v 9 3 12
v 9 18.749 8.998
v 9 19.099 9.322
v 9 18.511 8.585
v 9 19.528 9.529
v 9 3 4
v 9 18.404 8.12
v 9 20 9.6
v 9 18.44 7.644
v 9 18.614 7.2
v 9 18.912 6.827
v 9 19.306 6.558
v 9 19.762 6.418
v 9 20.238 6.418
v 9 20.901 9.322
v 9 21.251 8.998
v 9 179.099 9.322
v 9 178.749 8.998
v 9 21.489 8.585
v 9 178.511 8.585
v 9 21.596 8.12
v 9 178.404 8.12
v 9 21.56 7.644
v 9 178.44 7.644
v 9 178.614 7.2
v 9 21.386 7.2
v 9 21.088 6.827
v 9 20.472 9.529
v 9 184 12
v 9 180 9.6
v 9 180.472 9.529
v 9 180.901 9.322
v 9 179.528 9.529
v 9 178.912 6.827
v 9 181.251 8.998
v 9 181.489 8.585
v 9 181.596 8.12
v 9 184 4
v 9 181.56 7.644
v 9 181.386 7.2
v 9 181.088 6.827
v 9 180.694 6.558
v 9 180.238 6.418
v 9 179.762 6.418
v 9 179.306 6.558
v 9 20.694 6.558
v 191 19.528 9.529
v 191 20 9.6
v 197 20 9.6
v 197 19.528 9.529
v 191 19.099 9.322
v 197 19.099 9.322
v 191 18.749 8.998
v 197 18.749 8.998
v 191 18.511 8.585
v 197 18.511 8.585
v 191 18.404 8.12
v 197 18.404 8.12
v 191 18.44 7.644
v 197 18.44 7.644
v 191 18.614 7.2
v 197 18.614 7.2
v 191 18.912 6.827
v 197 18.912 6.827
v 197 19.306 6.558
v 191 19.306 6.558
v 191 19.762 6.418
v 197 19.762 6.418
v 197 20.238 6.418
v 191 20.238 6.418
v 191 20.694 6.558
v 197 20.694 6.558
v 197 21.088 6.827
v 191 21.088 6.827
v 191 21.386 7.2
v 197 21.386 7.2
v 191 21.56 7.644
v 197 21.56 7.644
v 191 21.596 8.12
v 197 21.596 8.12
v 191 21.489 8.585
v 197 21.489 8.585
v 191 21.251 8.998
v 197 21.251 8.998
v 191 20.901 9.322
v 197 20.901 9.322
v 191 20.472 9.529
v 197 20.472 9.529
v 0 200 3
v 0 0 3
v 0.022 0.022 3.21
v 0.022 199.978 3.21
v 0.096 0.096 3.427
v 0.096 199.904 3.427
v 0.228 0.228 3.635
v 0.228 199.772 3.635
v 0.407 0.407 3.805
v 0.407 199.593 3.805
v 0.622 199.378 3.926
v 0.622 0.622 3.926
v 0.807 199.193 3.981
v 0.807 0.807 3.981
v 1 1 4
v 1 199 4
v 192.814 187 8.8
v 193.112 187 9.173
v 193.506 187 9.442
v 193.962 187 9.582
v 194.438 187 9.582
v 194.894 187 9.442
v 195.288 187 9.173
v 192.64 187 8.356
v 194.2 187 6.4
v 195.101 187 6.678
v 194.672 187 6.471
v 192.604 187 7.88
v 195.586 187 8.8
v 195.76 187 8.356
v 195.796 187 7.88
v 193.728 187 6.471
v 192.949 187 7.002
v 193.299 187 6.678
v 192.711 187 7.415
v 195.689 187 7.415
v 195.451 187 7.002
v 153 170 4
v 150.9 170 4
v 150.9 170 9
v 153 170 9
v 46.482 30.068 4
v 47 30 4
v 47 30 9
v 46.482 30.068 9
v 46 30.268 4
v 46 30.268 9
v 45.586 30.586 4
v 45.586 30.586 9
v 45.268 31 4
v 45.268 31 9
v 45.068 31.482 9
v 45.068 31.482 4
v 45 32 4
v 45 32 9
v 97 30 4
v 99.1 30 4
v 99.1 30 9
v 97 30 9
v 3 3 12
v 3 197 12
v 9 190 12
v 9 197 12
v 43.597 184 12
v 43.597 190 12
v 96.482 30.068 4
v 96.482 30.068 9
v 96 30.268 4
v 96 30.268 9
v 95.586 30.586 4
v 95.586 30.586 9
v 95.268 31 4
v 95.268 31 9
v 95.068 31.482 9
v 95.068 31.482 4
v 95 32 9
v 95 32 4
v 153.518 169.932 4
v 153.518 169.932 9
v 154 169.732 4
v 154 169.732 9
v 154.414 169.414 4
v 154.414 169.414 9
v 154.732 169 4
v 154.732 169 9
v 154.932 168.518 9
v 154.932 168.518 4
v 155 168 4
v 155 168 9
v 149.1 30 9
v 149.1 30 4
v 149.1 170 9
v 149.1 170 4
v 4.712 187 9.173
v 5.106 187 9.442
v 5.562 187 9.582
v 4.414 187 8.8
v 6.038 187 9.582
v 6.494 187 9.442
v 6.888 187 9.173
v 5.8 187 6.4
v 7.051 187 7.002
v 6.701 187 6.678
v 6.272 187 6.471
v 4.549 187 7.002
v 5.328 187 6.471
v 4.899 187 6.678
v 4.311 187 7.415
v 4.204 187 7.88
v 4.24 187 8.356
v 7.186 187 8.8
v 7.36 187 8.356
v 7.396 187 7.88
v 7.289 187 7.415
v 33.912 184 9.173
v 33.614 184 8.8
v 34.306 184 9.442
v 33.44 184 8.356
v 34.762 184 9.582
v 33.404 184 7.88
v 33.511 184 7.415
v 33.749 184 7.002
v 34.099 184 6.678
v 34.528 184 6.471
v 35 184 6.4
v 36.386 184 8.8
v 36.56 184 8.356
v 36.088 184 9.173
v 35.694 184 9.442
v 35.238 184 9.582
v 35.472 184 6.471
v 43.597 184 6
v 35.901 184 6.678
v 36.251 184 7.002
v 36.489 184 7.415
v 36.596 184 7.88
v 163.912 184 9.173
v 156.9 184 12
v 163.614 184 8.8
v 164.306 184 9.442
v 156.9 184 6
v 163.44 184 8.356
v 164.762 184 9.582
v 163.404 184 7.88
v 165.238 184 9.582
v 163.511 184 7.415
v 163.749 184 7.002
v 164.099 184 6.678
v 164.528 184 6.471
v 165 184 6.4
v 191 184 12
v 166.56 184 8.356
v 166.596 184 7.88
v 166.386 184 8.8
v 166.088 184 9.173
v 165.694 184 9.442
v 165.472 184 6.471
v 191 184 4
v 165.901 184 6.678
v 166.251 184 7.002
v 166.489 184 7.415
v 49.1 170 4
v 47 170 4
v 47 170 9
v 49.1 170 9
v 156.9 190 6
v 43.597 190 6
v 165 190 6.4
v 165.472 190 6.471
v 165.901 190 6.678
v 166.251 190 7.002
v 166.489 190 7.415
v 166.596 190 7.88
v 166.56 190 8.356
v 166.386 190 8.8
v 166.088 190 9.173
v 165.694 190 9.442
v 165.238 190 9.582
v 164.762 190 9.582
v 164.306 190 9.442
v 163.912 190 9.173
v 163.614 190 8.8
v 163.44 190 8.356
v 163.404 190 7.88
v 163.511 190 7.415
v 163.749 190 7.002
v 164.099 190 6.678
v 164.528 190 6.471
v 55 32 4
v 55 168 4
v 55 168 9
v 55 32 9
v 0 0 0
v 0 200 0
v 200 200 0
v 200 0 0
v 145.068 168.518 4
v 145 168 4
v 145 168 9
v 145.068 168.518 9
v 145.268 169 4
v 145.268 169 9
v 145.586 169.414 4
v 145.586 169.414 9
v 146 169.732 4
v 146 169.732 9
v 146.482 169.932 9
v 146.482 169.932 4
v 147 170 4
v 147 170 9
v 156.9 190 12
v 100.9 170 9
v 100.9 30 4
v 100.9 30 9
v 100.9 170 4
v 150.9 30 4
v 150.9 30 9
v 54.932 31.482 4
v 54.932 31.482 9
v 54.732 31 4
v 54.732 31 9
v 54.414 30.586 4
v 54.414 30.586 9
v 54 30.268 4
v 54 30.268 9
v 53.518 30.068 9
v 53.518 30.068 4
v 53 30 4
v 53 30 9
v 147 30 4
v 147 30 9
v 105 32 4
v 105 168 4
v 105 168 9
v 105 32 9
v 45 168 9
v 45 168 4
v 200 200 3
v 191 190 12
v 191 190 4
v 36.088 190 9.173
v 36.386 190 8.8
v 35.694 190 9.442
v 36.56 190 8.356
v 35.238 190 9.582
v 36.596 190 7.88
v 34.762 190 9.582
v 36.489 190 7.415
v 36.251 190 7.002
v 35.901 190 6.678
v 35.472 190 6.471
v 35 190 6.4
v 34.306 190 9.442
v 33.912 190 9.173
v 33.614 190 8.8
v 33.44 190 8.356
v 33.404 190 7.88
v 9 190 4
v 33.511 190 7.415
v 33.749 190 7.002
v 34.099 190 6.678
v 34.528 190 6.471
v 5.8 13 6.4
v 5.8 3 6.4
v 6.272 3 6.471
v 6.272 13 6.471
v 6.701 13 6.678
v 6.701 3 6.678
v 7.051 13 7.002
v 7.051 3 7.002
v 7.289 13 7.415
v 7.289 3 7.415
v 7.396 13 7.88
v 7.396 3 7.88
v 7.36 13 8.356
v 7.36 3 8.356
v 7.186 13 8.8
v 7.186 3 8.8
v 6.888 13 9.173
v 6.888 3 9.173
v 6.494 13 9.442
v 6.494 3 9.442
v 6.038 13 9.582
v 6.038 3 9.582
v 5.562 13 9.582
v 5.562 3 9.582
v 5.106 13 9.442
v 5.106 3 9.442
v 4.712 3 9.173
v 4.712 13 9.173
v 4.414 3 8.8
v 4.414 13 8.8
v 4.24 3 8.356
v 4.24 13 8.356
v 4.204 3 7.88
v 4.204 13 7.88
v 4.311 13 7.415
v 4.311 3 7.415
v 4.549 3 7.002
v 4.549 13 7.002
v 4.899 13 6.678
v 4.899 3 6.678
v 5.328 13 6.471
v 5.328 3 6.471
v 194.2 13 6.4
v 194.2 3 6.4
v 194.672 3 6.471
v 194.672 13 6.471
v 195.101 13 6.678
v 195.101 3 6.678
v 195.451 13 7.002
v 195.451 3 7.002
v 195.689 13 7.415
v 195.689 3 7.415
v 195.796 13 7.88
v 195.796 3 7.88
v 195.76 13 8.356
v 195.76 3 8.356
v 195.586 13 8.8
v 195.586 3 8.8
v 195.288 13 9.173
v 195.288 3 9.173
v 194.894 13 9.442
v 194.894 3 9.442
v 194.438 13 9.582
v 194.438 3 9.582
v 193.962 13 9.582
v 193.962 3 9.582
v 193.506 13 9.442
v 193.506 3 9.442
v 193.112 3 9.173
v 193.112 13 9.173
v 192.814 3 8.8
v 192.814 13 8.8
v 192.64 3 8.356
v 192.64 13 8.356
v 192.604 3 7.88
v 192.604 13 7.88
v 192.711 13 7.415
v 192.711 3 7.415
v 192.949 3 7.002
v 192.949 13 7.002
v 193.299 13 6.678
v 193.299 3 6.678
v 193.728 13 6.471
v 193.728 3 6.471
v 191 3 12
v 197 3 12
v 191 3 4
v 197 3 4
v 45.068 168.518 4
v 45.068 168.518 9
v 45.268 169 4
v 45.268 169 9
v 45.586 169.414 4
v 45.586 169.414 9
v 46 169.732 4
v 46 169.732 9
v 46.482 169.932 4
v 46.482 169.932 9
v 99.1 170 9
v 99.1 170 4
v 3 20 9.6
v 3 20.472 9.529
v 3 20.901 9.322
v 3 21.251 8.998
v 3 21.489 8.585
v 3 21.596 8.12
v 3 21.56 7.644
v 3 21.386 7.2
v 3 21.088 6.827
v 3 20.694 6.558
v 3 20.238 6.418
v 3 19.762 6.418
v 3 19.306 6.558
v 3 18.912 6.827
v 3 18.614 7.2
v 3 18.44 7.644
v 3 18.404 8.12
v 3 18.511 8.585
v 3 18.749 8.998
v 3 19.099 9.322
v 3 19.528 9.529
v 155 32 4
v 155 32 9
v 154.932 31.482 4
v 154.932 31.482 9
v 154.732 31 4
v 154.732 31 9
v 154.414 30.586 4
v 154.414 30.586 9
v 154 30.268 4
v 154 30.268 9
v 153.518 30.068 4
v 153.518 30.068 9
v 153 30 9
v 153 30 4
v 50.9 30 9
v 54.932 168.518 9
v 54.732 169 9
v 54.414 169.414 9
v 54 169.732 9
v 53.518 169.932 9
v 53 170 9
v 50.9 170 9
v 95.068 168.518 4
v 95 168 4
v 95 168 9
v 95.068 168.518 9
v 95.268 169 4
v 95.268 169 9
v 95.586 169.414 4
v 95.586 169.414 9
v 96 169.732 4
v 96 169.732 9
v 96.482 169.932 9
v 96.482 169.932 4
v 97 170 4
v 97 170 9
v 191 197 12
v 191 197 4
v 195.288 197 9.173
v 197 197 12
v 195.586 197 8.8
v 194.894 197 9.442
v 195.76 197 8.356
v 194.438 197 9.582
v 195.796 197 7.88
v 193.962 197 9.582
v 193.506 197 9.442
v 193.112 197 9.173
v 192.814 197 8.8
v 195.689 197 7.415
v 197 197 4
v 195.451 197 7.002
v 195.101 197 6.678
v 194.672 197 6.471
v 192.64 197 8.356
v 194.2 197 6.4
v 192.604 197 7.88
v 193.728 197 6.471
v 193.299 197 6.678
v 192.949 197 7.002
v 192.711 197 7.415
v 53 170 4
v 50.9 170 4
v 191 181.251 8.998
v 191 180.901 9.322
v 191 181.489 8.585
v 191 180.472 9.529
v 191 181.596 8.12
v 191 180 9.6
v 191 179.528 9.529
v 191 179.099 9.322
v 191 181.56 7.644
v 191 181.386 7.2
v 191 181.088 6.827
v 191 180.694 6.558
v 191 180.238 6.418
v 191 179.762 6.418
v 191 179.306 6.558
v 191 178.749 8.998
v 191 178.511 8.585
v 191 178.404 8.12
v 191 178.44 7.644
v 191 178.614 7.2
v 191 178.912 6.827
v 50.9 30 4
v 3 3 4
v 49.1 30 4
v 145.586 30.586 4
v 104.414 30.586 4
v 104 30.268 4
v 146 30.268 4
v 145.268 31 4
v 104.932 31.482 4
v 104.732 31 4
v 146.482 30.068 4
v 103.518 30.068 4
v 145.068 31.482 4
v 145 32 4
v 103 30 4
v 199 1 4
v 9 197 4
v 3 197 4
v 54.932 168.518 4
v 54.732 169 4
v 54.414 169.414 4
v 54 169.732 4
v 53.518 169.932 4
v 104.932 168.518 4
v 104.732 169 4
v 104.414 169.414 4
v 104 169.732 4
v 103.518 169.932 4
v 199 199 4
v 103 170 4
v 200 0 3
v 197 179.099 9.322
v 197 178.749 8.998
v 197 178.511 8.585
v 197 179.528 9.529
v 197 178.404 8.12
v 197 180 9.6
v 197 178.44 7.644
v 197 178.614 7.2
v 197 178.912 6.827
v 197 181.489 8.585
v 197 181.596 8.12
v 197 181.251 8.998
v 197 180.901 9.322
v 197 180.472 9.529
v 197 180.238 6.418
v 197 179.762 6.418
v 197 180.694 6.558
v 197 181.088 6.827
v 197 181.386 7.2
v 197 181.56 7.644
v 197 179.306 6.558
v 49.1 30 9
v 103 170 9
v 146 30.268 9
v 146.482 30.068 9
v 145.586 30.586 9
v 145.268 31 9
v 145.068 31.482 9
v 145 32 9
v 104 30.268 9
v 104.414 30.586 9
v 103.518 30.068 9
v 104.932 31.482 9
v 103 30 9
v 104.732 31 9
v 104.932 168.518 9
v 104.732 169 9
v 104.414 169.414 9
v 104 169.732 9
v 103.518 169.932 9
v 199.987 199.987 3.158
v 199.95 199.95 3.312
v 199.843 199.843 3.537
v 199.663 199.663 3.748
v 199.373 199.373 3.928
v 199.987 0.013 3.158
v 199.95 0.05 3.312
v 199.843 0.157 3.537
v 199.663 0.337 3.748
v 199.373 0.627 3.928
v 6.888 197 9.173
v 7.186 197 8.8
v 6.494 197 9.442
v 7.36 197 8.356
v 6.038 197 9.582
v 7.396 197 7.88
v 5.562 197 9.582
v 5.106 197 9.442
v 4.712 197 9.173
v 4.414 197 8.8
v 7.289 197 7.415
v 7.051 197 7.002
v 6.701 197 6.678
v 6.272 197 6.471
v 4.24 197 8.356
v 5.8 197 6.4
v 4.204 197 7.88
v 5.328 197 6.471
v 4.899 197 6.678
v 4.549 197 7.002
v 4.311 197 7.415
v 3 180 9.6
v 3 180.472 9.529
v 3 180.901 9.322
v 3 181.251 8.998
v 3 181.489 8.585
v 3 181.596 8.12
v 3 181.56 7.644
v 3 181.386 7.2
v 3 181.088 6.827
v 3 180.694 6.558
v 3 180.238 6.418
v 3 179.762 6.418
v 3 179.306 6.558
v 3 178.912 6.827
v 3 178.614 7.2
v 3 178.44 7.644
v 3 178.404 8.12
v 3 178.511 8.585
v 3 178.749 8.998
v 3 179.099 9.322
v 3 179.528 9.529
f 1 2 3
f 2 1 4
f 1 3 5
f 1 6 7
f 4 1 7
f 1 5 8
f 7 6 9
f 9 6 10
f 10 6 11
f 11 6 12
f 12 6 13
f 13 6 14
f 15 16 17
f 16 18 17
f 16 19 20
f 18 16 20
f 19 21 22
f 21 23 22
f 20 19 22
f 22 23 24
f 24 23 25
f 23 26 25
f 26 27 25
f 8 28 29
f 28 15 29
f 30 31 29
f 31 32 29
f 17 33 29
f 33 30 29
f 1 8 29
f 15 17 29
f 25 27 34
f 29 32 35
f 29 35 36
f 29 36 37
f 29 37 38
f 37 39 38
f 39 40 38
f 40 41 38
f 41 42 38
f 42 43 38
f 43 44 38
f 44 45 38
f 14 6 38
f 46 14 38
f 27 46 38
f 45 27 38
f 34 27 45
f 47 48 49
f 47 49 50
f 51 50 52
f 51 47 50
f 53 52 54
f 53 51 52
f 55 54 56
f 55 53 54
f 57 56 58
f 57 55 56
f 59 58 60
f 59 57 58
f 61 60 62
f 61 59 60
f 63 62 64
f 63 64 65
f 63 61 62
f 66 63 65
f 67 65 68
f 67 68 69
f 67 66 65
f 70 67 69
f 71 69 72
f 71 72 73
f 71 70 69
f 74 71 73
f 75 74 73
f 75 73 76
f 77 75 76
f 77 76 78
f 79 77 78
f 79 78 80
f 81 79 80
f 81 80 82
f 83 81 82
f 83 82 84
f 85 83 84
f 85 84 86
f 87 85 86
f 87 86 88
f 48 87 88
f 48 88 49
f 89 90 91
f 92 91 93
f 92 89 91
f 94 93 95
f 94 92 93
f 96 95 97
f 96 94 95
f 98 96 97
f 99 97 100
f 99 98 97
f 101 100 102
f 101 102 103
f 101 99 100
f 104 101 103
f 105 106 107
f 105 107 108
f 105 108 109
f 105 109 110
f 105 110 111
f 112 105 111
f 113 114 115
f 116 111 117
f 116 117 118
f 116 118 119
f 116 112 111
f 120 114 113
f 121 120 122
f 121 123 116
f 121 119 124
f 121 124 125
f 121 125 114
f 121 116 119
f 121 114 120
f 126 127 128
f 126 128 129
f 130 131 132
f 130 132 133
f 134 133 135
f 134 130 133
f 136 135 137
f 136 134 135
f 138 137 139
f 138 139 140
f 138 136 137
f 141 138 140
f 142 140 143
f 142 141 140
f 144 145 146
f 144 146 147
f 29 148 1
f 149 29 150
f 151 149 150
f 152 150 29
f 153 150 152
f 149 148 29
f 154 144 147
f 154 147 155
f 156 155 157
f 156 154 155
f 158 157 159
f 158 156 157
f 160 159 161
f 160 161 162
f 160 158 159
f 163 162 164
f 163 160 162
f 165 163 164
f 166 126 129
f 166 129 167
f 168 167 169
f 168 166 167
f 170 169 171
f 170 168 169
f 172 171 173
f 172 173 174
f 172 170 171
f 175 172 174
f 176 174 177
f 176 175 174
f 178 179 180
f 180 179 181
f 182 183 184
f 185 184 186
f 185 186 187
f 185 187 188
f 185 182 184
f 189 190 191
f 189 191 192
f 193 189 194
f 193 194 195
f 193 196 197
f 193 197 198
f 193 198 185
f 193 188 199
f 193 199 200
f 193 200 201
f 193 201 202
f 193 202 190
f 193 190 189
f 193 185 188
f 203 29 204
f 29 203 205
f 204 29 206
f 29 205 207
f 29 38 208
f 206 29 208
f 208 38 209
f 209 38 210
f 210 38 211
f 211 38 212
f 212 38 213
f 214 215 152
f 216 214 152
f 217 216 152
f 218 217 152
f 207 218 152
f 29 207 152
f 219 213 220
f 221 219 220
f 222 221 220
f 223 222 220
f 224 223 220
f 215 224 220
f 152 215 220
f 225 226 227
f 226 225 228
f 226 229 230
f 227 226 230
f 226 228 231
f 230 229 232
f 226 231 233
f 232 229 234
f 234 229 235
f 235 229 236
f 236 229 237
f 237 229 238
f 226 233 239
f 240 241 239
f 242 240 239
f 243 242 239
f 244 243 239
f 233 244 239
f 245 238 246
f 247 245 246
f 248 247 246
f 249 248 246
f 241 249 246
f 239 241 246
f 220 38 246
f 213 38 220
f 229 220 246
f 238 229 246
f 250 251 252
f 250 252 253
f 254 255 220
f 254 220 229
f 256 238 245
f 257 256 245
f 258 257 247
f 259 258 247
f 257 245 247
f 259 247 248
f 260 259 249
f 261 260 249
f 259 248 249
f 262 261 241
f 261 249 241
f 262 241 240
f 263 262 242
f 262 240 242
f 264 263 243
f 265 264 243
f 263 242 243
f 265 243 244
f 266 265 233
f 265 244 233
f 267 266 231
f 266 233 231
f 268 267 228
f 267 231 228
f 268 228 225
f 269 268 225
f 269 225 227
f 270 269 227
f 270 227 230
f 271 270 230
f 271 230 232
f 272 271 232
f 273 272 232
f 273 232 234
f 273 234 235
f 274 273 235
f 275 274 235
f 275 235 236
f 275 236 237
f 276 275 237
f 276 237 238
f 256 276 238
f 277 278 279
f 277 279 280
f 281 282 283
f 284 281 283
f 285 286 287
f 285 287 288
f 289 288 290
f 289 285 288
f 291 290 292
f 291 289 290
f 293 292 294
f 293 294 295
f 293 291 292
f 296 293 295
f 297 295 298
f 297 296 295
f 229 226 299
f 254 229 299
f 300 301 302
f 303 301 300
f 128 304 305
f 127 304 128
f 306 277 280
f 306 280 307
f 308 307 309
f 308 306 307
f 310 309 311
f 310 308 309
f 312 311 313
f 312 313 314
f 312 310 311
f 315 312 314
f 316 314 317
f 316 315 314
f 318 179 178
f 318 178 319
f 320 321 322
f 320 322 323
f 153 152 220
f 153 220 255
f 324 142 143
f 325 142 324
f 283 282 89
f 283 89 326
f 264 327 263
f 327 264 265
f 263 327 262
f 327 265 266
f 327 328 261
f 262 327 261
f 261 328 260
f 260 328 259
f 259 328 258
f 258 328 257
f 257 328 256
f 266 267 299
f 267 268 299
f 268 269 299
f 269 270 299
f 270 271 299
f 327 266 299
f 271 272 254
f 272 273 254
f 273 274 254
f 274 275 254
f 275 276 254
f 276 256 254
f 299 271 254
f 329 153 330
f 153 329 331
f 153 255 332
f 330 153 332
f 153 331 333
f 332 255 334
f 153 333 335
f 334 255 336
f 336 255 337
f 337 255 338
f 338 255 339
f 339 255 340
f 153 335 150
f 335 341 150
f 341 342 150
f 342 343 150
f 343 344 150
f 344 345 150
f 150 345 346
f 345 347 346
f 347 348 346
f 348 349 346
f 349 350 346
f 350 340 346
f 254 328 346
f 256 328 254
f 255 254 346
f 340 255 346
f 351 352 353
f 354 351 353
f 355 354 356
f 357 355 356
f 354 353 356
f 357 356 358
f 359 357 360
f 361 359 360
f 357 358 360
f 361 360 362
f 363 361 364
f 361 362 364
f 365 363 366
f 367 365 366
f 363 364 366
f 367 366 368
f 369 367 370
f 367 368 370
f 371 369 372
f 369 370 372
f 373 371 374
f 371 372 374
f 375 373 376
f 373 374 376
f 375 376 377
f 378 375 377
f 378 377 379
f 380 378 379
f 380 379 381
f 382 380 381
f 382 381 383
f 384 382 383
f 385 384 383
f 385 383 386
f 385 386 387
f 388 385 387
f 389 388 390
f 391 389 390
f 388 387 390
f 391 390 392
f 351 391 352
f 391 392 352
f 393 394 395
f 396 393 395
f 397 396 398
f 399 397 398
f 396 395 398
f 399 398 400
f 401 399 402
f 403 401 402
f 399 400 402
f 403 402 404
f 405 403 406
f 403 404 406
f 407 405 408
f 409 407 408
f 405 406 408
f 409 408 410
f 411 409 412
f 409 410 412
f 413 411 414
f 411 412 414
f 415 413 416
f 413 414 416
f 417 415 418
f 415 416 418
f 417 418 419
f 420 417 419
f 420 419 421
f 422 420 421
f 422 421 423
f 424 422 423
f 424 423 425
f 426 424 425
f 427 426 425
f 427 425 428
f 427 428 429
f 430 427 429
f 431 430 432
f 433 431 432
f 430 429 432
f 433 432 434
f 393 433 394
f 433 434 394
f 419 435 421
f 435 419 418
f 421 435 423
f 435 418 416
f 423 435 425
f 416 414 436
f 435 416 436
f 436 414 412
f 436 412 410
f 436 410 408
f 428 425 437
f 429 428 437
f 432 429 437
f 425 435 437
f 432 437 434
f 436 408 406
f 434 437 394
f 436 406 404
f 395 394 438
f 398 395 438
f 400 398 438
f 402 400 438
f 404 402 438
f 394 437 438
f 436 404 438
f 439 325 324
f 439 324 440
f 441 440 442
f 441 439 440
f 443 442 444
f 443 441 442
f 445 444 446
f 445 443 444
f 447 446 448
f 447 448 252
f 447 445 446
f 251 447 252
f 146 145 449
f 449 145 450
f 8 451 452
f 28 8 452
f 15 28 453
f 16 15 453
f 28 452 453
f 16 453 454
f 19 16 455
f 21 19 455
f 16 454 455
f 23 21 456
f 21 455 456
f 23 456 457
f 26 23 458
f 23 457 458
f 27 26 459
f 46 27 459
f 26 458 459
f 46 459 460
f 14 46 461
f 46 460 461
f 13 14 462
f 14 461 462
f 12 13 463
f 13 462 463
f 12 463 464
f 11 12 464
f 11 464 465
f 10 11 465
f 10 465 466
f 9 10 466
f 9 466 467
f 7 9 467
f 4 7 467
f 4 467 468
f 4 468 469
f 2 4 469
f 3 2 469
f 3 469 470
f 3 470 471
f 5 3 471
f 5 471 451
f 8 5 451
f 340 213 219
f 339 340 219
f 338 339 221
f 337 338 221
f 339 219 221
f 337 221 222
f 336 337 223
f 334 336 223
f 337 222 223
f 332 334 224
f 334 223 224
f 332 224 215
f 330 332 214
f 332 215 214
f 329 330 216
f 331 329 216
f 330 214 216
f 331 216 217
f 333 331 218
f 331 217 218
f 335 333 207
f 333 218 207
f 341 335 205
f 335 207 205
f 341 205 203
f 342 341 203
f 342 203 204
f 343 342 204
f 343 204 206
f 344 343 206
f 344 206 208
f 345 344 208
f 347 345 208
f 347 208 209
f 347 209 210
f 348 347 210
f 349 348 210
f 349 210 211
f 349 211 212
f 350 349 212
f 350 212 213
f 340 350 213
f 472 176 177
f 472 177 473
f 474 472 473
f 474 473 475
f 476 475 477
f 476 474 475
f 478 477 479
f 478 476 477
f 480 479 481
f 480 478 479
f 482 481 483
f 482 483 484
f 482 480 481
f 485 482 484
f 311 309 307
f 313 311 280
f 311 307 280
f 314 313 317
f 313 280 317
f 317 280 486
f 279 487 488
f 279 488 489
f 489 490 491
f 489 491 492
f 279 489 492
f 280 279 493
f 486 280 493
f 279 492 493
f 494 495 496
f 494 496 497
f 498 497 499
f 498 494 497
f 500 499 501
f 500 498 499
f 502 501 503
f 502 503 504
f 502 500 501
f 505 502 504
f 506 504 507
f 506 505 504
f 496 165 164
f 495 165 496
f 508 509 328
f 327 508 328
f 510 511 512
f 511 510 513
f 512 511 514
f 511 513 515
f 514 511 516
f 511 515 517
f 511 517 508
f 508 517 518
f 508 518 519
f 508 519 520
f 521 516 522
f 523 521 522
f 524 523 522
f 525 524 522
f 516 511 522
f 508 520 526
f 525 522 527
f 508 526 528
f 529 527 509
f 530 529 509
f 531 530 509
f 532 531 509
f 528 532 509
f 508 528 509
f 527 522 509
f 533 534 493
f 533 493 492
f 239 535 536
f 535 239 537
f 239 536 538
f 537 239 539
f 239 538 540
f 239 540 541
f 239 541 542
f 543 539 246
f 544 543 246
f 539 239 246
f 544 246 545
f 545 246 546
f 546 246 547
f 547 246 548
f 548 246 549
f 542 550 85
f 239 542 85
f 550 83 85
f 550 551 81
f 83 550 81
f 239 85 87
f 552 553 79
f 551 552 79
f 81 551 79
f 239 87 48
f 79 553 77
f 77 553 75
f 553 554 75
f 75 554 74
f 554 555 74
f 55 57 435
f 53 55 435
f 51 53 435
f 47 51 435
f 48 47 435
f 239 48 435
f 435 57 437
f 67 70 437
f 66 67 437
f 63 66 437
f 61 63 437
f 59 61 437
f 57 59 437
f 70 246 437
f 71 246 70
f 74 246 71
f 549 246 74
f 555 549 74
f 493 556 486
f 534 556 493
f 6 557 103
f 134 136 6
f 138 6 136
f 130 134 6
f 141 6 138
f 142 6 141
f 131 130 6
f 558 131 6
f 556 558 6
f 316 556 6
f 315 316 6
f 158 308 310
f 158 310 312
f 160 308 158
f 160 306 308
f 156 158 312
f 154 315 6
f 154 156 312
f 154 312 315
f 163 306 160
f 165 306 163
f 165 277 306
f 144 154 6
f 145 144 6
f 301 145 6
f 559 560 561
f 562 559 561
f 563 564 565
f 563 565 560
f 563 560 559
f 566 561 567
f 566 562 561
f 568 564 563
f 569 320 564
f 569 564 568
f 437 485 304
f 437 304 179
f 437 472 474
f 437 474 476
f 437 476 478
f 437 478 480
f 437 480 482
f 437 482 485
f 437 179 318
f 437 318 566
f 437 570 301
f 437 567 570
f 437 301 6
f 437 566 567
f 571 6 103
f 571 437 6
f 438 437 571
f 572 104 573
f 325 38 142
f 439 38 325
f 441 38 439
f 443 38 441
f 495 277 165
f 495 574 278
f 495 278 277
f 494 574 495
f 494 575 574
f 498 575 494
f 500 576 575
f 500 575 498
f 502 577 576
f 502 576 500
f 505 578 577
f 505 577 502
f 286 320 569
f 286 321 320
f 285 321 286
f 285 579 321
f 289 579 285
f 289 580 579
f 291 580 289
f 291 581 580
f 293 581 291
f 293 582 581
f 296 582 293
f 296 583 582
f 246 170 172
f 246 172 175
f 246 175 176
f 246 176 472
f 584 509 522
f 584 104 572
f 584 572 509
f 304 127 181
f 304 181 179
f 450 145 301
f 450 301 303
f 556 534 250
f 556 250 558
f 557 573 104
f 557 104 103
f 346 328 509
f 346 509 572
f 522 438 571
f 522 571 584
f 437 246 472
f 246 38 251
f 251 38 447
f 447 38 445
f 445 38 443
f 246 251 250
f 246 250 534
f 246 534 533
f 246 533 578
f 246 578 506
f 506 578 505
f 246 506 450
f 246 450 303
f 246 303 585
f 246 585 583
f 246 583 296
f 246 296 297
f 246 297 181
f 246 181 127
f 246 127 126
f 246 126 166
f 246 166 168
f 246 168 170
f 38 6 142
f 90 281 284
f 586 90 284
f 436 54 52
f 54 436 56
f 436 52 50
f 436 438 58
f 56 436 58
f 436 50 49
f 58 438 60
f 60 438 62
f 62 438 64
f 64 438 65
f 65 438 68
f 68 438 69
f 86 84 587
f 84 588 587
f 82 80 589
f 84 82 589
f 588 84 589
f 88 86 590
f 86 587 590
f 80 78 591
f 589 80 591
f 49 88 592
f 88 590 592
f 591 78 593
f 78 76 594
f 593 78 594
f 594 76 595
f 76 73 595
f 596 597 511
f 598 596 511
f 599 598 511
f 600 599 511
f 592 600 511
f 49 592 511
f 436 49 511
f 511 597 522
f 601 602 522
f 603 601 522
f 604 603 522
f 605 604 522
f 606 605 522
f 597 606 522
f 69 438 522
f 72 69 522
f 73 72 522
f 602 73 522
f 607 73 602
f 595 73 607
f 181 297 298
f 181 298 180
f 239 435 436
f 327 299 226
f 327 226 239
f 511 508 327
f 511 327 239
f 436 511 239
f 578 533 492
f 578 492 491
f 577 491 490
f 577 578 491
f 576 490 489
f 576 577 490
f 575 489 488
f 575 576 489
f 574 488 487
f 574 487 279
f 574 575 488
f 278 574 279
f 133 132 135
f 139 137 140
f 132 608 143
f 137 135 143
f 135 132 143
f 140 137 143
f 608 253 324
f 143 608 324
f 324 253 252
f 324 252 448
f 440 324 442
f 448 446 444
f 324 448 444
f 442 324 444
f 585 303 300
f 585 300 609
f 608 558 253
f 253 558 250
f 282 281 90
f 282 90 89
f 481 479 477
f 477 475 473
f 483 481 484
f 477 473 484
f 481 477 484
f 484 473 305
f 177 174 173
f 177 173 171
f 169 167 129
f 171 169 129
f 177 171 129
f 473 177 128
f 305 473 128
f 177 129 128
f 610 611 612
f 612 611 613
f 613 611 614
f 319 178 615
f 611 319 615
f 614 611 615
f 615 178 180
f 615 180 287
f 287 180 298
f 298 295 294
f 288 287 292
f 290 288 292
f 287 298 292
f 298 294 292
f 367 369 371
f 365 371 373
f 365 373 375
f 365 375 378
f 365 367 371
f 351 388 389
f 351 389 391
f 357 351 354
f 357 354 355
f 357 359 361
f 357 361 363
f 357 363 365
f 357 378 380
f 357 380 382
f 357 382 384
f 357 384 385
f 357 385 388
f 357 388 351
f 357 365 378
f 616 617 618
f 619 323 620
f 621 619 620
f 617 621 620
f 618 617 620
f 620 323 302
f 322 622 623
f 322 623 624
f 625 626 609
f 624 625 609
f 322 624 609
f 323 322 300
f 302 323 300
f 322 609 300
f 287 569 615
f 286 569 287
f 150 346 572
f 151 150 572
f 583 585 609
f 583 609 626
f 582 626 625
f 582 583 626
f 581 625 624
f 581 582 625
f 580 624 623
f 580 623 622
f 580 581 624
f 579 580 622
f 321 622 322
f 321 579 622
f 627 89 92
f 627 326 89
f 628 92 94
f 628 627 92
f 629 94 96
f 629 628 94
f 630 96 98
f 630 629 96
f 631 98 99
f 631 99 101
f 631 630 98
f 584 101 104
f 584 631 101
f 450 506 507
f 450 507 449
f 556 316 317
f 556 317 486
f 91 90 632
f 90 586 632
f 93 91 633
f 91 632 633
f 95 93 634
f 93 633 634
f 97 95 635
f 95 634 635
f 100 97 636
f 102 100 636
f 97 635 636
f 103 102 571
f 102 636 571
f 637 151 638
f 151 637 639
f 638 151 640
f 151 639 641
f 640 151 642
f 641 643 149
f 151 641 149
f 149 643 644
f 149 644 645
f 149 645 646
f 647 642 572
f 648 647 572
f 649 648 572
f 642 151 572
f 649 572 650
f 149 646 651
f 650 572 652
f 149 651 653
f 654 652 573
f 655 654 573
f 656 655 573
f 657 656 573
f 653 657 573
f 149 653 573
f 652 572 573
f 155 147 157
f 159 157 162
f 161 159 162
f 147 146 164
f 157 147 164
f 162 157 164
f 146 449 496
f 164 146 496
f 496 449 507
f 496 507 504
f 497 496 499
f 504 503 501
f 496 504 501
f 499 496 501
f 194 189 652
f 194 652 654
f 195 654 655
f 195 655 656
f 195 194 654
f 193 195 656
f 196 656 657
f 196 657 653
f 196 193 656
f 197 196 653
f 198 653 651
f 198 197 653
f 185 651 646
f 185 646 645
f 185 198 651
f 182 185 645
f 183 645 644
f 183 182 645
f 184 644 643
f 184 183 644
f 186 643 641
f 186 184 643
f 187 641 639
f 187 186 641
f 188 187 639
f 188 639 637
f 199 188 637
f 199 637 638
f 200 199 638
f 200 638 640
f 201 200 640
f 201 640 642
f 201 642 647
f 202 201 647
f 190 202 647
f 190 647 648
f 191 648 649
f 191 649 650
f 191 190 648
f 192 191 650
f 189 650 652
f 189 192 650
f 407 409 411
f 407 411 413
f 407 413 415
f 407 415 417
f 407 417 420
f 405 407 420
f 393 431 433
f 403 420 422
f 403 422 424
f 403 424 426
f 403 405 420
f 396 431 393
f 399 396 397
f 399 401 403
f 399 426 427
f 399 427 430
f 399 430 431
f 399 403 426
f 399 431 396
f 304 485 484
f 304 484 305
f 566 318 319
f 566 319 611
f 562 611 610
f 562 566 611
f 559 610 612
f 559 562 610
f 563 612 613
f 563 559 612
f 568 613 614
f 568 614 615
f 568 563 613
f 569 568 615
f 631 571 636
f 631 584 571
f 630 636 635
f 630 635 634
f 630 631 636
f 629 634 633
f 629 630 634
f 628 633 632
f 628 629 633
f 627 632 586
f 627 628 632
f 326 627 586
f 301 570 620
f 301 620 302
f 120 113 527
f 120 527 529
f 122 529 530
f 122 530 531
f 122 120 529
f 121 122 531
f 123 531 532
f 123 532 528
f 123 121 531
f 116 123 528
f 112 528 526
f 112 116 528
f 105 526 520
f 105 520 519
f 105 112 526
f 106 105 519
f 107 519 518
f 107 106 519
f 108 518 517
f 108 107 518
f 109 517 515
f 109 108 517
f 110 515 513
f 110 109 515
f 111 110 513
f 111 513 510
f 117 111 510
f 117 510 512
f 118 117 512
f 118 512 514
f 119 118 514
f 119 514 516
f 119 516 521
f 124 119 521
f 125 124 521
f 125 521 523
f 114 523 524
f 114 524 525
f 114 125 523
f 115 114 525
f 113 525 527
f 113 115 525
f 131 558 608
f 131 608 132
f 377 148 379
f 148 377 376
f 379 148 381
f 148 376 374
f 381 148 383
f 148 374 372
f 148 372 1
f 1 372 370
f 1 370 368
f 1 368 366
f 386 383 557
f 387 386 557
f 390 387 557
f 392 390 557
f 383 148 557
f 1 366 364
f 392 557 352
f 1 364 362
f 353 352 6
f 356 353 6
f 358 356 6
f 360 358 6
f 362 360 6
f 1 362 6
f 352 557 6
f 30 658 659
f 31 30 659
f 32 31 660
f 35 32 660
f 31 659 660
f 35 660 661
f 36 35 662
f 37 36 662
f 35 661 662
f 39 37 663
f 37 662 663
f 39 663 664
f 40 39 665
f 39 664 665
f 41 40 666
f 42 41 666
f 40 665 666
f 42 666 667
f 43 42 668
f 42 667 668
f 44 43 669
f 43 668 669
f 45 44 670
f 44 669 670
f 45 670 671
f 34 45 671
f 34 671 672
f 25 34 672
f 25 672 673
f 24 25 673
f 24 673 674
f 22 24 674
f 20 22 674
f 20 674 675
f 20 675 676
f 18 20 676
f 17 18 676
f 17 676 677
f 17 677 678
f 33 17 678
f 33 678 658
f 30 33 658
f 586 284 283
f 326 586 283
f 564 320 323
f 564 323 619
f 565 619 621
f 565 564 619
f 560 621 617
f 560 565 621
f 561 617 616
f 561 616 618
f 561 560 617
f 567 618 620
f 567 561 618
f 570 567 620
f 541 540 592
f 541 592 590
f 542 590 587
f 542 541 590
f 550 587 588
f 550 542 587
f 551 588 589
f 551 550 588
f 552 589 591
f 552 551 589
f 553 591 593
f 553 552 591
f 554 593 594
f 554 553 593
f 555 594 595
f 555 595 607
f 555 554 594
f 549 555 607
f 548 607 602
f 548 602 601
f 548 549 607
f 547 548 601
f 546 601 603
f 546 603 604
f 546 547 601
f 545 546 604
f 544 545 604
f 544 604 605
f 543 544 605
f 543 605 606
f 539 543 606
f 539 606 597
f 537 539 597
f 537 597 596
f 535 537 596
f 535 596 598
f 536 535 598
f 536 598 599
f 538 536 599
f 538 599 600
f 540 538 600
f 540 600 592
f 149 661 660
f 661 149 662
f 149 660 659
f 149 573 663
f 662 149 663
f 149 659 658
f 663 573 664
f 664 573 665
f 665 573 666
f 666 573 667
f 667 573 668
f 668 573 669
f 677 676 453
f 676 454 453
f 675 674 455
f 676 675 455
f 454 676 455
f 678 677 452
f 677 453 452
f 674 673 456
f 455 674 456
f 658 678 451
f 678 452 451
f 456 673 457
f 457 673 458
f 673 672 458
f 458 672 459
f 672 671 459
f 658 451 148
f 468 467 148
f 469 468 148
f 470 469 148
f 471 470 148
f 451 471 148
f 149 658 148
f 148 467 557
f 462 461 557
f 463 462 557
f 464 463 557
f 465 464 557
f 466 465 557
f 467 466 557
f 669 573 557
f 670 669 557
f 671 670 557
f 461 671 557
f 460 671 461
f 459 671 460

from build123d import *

# Parameters (mm, degrees)
ESQUISSE1_W                 = 200
ESQUISSE1_H                 = 200
BOSS_EXTRU_PAROIE_DEPTH     = 4
BOSS_EXTRU_BORDS_DEPTH      = 8
BOSS_EXTRU_GLISSIERES_DEPTH = 5
CONG_1_R                    = 1
ESQUISSE8_W                 = 1.8
ESQUISSE8_H                 = 180
ENL_V_MAT_EXTRU_6_DEPTH     = 283.955826941
ESQUISSE5_R                 = 1.6
ENL_V_MAT_EXTRU_2_DEPTH     = 10
ENL_V_START                 = -10
ESQUISSE6_R                 = 1.6
ENL_V_MAT_EXTRU_3_DEPTH     = 10
ESQUISSE7_R                 = 1.6
ENL_V_MAT_EXTRU_4_DEPTH     = 10
ESQUISSE10_R                = 1.6
ENL_V_MAT_EXTRU_8_DEPTH     = 10
ESQUISSE11_W                = 113.303164178
ESQUISSE11_H                = 6
ENL_V_MAT_EXTRU_9_DEPTH     = 6
ESQUISSE9_R                 = 1.6
ENL_V_MAT_EXTRU_10_DEPTH    = 10


with BuildPart() as part:
    # Esquisse1 → Boss.-Extru. Paroie (new body)
    with BuildSketch(Plane.XY):
        with Locations((100, 100)):
            Rectangle(ESQUISSE1_W, ESQUISSE1_H)
    extrude(amount=BOSS_EXTRU_PAROIE_DEPTH)

    # Esquisse4 → Boss.-Extru. Bords (add)
    with BuildSketch(Plane.XY.offset(4)):
        Polygon((3, 3), (9, 3), (9, 184), (191, 184), (191, 3), (197, 3), (197, 197), (191, 197), (191, 190), (9, 190), (9, 197), (3, 197), align=None)
    extrude(amount=BOSS_EXTRU_BORDS_DEPTH)

    # Esquisse2 → Boss.-Extru. Glissieres (add)
    with BuildSketch(Plane.XY.offset(4)):
        with BuildLine():
            Line((47, 170), (53, 170))
            ThreePointArc((53, 170), (54.414213562, 169.414213562), (55, 168))
            Line((55, 168), (55, 32))
            ThreePointArc((55, 32), (54.414213562, 30.585786438), (53, 30))
            Line((53, 30), (47, 30))
            ThreePointArc((47, 30), (45.585786438, 30.585786438), (45, 32))
            Line((45, 32), (45, 168))
            ThreePointArc((45, 168), (45.585786438, 169.414213562), (47, 170))
        make_face()
        with BuildLine():
            Line((97, 170), (103, 170))
            ThreePointArc((103, 170), (104.414213562, 169.414213562), (105, 168))
            Line((105, 168), (105, 32))
            ThreePointArc((105, 32), (104.414213562, 30.585786438), (103, 30))
            Line((103, 30), (97, 30))
            ThreePointArc((97, 30), (95.585786438, 30.585786438), (95, 32))
            Line((95, 32), (95, 168))
            ThreePointArc((95, 168), (95.585786438, 169.414213562), (97, 170))
        make_face()
        with BuildLine():
            Line((147, 170), (153, 170))
            ThreePointArc((153, 170), (154.414213562, 169.414213562), (155, 168))
            Line((155, 168), (155, 32))
            ThreePointArc((155, 32), (154.414213562, 30.585786438), (153, 30))
            Line((153, 30), (147, 30))
            ThreePointArc((147, 30), (145.585786438, 30.585786438), (145, 32))
            Line((145, 32), (145, 168))
            ThreePointArc((145, 168), (145.585786438, 169.414213562), (147, 170))
        make_face()
    extrude(amount=BOSS_EXTRU_GLISSIERES_DEPTH)

    # Congé1
    cong_1_edges = [part.edges().sort_by_distance(p)[0] for p in [
        (200, 100, 4),
        (100, 200, 4),
        (0, 100, 4),
        (100, 0, 4),
    ]]
    fillet(cong_1_edges, radius=CONG_1_R)

    # Esquisse8 → Enlèv. mat.-Extru.6 (cut, through all)
    with BuildSketch(Plane.XY.offset(4)):
        with Locations((100, 85)):
            Rectangle(ESQUISSE8_W, ESQUISSE8_H)
        with Locations((150, 85)):
            Rectangle(ESQUISSE8_W, ESQUISSE8_H)
        with Locations((50, 85)):
            Rectangle(ESQUISSE8_W, ESQUISSE8_H)
    extrude(amount=ENL_V_MAT_EXTRU_6_DEPTH, mode=Mode.SUBTRACT)

    # Esquisse5 → Enlèv. mat.-Extru.2 (cut)
    with BuildSketch(Plane.ZY.offset(-3)):
        with Locations((8, 180)):
            Circle(ESQUISSE5_R)
        with Locations((8, 20)):
            Circle(ESQUISSE5_R)
    extrude(amount=-ENL_V_MAT_EXTRU_2_DEPTH, mode=Mode.SUBTRACT)

    # Esquisse6 → Enlèv. mat.-Extru.3 (cut)
    with BuildSketch(Plane(origin=(197, 0, 0), x_dir=(0, 0, -1), z_dir=(1, 0, 0)).offset(ENL_V_START)):
        with Locations(Location((-8, 180, 0), (0, 0, 180))):
            Circle(ESQUISSE6_R)
        with Locations(Location((-8, 20, 0), (0, 0, 180))):
            Circle(ESQUISSE6_R)
    extrude(amount=ENL_V_MAT_EXTRU_3_DEPTH, mode=Mode.SUBTRACT)

    # Esquisse7 → Enlèv. mat.-Extru.4 (cut)
    with BuildSketch(Plane.XZ.offset(-184)):
        with Locations(Location((35, 8, 0), (0, 0, 270))):
            Circle(ESQUISSE7_R)
        with Locations(Location((165, 8, 0), (0, 0, 270))):
            Circle(ESQUISSE7_R)
    extrude(amount=-ENL_V_MAT_EXTRU_4_DEPTH, mode=Mode.SUBTRACT)

    # Esquisse10 → Enlèv. mat.-Extru.8 (cut)
    with BuildSketch(Plane(origin=(0, 3, 0), x_dir=(-1, 0, 0), z_dir=(0, -1, 0))):
        with Locations(Location((-194.2, -8, 0), (0, 0, 90))):
            Circle(ESQUISSE10_R)
        with Locations(Location((-5.8, -8, 0), (0, 0, 90))):
            Circle(ESQUISSE10_R)
    extrude(amount=-ENL_V_MAT_EXTRU_8_DEPTH, mode=Mode.SUBTRACT)

    # Esquisse11 → Enlèv. mat.-Extru.9 (cut)
    with BuildSketch(Plane.XY.offset(12)):
        with Locations((100.248809194, 187)):
            Rectangle(ESQUISSE11_W, ESQUISSE11_H)
    extrude(amount=-ENL_V_MAT_EXTRU_9_DEPTH, mode=Mode.SUBTRACT)

    # Esquisse9 → Enlèv. mat.-Extru.10 (cut)
    with BuildSketch(Plane(origin=(0, 197, 0), x_dir=(1, 0, 0), z_dir=(0, 1, 0)).offset(ENL_V_START)):
        with Locations(Location((194.2, -8, 0), (0, 0, 90))):
            Circle(ESQUISSE9_R)
        with Locations(Location((5.8, -8, 0), (0, 0, 90))):
            Circle(ESQUISSE9_R)
    extrude(amount=ENL_V_MAT_EXTRU_10_DEPTH, mode=Mode.SUBTRACT)


solid = part.part
